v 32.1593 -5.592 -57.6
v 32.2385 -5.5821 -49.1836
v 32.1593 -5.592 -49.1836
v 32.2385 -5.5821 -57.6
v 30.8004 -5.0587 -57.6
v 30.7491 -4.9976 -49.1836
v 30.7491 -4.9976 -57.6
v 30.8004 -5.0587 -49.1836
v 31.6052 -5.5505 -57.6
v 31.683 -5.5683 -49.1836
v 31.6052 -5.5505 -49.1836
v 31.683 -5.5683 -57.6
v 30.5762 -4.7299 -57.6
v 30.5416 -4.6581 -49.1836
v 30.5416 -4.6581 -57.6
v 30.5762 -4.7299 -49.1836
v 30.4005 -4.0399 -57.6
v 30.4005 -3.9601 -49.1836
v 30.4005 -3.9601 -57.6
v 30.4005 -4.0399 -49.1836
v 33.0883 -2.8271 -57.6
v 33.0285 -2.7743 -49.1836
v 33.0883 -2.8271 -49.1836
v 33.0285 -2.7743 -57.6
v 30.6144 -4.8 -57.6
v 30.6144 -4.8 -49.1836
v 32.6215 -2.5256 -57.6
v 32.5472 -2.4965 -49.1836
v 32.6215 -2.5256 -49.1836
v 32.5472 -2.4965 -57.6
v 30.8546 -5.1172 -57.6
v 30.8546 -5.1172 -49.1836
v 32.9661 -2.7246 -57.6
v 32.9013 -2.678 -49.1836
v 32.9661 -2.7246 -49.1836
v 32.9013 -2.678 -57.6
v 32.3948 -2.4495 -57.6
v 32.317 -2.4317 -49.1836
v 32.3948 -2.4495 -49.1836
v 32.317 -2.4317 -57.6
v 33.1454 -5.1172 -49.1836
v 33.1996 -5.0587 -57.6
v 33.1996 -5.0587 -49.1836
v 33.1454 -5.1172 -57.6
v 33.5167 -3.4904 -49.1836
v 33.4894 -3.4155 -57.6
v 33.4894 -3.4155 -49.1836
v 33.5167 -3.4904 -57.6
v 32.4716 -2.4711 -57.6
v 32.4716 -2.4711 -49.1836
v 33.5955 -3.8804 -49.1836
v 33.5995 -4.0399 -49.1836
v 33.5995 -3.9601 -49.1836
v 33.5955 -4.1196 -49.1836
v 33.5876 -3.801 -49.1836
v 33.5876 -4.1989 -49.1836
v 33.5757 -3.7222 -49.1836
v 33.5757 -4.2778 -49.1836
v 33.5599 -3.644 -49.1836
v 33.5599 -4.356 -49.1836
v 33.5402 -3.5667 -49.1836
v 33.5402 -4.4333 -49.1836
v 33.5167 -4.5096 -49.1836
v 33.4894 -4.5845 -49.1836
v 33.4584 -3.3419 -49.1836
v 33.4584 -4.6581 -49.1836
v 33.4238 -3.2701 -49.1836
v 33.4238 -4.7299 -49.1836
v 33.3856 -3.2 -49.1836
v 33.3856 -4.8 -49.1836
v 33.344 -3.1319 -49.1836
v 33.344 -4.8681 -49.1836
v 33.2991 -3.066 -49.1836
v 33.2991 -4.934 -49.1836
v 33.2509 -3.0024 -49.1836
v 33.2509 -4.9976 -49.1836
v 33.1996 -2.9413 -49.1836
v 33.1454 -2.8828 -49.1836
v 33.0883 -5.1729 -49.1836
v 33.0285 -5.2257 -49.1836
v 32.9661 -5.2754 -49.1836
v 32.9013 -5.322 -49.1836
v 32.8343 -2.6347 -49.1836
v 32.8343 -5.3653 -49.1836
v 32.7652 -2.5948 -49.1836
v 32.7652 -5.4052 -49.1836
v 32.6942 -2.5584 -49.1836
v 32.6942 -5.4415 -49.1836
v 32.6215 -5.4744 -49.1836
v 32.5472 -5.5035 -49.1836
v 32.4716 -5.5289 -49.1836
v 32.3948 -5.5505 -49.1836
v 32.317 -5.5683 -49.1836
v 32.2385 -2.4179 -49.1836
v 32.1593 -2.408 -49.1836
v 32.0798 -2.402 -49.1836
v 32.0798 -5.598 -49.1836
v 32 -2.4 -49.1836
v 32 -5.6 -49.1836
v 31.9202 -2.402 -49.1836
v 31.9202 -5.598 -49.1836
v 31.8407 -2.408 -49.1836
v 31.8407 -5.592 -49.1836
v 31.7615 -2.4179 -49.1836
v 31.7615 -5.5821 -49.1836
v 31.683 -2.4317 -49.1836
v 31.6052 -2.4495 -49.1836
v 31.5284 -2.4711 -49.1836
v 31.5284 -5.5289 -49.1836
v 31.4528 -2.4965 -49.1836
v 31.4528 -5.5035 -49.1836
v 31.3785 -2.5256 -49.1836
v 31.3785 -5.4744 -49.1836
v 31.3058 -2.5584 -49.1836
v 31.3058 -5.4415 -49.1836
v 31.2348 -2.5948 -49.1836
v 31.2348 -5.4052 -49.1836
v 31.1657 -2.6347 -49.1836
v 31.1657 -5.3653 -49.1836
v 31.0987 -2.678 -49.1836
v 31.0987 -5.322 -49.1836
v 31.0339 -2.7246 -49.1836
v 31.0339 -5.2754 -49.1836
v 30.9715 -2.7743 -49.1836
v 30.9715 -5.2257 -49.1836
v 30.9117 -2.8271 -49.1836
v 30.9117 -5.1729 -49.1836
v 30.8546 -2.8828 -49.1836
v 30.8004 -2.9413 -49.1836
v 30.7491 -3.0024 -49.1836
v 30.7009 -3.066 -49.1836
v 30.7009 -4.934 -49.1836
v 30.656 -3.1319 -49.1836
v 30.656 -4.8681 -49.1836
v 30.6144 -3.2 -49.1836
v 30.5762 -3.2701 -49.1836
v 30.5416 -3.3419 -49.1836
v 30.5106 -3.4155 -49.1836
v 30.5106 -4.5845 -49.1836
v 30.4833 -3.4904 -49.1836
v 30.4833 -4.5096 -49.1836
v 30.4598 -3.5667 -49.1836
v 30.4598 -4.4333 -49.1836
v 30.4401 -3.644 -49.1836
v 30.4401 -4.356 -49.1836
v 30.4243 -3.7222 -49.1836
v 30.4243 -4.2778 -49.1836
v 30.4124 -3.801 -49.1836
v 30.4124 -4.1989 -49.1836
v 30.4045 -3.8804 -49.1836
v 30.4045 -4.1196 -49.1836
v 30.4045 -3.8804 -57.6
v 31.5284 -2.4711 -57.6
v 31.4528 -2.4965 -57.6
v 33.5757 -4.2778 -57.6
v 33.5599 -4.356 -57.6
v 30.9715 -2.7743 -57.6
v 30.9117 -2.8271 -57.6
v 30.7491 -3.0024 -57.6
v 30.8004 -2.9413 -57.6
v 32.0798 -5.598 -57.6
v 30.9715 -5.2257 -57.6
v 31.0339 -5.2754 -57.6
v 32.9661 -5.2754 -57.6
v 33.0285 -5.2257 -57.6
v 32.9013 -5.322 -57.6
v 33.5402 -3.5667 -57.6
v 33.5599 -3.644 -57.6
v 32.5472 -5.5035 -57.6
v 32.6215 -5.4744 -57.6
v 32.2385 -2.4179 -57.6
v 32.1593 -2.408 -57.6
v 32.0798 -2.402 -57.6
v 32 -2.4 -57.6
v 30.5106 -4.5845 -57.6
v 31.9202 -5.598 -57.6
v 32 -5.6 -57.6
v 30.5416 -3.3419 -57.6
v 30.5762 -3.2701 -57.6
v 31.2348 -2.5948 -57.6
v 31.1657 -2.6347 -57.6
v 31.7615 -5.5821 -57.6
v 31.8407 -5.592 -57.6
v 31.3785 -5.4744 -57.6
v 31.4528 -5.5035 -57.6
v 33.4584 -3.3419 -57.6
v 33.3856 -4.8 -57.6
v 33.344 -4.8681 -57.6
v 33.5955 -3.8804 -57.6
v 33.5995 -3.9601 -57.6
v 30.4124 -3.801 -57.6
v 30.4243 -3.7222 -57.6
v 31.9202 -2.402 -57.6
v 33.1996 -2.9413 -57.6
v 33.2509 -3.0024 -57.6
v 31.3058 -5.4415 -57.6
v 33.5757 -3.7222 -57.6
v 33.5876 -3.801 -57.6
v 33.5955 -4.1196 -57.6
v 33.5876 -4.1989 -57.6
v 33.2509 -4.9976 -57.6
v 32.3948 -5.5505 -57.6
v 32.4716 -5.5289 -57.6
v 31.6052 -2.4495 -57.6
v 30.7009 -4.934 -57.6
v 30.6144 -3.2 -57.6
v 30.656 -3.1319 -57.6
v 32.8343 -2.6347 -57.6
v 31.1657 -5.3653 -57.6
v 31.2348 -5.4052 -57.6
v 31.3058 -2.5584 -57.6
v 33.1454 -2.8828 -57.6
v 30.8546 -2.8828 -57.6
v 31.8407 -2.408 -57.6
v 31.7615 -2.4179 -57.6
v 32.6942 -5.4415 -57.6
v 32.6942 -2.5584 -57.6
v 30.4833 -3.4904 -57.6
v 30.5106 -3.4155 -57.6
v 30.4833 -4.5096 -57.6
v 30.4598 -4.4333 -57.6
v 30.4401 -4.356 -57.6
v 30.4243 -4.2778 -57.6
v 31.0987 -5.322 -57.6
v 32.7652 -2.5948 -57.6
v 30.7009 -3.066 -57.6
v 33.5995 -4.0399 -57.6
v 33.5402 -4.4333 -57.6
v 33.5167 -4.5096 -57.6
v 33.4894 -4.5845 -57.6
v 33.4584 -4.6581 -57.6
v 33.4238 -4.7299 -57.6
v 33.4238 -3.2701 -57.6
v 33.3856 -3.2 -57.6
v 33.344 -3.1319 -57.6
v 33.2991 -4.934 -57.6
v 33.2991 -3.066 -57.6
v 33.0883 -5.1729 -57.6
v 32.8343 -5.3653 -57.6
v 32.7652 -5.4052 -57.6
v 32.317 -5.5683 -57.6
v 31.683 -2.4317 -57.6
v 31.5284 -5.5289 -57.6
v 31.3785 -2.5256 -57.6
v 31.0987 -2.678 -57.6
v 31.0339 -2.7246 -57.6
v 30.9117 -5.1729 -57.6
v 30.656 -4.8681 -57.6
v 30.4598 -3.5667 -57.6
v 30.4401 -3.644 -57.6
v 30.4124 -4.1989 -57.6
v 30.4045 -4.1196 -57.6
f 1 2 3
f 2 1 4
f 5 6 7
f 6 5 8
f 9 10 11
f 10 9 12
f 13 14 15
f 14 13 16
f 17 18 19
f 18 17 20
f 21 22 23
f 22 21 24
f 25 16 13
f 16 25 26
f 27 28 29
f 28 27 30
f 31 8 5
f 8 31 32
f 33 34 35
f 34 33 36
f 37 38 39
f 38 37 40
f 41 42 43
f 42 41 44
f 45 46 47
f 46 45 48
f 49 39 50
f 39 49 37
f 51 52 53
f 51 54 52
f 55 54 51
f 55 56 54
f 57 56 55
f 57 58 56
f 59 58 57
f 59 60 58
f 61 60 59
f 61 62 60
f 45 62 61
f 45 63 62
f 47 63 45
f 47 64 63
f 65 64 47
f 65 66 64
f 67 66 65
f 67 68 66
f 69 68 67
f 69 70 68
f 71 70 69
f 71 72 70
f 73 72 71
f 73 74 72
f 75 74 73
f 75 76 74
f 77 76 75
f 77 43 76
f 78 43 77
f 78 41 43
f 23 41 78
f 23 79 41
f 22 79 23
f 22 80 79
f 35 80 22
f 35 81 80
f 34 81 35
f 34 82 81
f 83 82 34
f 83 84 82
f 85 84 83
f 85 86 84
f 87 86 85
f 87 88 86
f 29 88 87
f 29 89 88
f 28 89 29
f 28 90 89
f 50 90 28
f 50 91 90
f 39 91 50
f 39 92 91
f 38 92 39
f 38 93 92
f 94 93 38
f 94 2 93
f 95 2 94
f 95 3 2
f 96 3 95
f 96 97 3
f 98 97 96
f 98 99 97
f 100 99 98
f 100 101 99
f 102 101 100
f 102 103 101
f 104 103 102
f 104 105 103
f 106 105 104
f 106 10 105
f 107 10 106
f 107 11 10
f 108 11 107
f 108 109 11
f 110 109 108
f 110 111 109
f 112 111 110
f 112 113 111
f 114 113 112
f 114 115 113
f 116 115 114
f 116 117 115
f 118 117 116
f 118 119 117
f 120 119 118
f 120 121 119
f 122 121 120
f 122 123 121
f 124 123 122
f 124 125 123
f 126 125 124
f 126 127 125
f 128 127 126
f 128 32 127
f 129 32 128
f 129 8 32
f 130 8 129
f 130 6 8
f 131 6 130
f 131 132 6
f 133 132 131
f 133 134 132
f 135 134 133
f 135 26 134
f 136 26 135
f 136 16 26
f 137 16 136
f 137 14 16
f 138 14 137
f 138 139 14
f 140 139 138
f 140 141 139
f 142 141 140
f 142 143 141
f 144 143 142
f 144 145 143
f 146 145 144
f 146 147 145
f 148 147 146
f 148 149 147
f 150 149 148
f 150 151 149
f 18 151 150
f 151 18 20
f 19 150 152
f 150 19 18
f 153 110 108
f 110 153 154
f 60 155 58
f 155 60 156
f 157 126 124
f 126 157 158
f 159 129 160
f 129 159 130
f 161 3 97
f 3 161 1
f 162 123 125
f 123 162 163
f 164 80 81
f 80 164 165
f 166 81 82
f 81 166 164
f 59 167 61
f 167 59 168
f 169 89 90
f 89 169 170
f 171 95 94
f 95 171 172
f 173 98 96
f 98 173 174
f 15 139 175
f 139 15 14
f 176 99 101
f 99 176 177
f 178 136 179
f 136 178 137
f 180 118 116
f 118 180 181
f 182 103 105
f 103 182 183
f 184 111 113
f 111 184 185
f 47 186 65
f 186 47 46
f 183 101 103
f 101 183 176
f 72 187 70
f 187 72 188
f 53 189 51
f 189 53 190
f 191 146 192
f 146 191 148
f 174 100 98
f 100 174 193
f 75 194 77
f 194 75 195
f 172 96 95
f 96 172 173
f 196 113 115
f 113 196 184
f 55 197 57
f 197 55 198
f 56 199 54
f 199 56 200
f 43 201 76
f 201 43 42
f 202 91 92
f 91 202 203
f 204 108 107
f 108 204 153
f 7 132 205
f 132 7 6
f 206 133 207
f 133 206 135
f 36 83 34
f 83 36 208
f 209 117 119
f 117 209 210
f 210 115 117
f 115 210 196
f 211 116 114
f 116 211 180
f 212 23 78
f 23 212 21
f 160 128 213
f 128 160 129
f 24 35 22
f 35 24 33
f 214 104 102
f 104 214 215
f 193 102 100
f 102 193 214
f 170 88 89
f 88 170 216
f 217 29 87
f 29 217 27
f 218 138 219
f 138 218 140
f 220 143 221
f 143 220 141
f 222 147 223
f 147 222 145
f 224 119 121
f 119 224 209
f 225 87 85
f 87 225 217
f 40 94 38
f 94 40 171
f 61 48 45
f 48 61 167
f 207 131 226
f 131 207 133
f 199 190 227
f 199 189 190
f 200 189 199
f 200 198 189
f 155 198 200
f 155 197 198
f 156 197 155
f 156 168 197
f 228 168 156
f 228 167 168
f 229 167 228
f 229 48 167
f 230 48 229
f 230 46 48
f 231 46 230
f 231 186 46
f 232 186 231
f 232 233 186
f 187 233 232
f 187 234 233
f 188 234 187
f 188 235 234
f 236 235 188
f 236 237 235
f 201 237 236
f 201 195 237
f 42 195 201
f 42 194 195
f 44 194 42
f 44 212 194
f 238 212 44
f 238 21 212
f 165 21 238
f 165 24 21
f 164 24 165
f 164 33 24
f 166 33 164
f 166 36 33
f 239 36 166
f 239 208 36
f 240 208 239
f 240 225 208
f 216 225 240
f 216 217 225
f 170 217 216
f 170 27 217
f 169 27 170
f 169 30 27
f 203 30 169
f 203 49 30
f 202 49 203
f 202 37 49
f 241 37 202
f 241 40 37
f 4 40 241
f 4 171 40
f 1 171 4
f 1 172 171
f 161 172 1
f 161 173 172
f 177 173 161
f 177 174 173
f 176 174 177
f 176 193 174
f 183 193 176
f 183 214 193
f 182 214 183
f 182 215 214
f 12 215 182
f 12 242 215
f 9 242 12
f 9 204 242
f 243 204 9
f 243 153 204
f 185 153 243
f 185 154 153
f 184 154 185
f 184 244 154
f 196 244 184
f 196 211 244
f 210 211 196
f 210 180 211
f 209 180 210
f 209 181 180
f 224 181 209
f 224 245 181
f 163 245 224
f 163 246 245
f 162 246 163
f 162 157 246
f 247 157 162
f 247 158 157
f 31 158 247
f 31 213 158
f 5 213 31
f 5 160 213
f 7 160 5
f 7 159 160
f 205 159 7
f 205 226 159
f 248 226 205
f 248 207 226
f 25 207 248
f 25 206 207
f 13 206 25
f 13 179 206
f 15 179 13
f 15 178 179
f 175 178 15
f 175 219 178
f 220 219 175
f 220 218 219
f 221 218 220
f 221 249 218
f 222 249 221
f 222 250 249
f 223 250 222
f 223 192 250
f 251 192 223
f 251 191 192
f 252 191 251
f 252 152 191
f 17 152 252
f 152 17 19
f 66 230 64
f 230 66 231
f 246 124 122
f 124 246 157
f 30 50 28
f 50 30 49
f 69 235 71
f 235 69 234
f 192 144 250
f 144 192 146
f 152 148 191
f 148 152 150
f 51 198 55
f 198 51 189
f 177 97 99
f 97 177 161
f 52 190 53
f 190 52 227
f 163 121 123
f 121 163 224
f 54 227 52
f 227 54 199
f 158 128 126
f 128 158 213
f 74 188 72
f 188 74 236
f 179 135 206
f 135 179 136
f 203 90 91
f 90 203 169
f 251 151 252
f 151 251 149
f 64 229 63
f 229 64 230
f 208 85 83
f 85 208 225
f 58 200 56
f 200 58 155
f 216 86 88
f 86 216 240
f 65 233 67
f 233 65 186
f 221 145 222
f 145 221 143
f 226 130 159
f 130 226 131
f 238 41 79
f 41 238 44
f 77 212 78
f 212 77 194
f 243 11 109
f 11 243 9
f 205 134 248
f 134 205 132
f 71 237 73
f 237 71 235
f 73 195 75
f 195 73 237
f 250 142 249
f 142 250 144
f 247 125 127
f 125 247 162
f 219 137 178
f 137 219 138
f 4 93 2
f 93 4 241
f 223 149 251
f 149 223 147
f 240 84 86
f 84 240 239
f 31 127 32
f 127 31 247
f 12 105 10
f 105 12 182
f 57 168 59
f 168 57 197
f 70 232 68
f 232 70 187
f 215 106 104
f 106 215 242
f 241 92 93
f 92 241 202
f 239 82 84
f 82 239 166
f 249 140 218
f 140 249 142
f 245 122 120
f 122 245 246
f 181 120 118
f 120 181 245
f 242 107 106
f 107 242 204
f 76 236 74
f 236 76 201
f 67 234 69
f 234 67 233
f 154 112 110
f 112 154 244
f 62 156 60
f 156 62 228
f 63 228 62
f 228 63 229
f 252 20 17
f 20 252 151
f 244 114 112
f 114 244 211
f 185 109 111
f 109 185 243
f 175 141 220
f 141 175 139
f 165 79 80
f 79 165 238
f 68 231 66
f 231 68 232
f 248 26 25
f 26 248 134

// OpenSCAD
use <../../lib.scad>
use <../../p/1-4cyli.scad>
use <../../p/1-4edge.scad>
use <../../p/3-4edge.scad>
use <../../p/3-8cyli.scad>
use <../../p/3-8edge.scad>
use <../../p/4-4cyli.scad>
use <../../p/5-8edge.scad>
use <../../p/rect.scad>
use <../../p/rect1.scad>
use <../../p/rect2a.scad>
use <../../p/rect2p.scad>
use <../../p/rect3.scad>
use <../../p/stud3.scad>
use <../../p/stud4a.scad>
$fa=1; $fs=0.2;
function ldraw_lib__s__23996s01(realsolid=false) = [
// 0 ~Panel  8 x  8 x  6 Rock Corner Half
// 0 Name: s\23996s01.dat
// 0 Author: Philippe Hurbain [Philo]
// 0 !LDRAW_ORG Subpart UPDATE 2018-02
// 0 !LICENSE Licensed under CC BY 2.0 and CC BY 4.0 : see CAreadme.txt
// 
// 0 BFC CERTIFY CCW
  [0,"BFC","CERTIFY"],
  [0,"BFC","CCW"],
// 
// 0 !HISTORY 2016-03-18 {LEGO Digital Designer} Original part shape
// 0 !HISTORY 2016-06-09 [Philo] File preparation for LDraw Parts Tracker
// 0 !HISTORY 2018-12-08 [PTadmin] Official Update 2018-02
// 
// 
// 2 24 30 27 46 30 32 46
  [2,24,30,27,46,30,32,46],
// 4 16 110 144 50 74 144 46 70 144 46 50 144 50
  [4,16,110,144,50,74,144,46,70,144,46,50,144,50],
// 3 16 106 144 46 74 144 46 110 144 50
  [3,16,106,144,46,74,144,46,110,144,50],
// 4 16 74 144 46 74 144 -14 70 144 -10 70 144 46
  [4,16,74,144,46,74,144,-14,70,144,-10,70,144,46],
// 3 16 70 144 -10 74 144 -14 70 144 -14
  [3,16,70,144,-10,74,144,-14,70,144,-14],
// 3 16 70 144 46 50 144 46 50 144 50
  [3,16,70,144,46,50,144,46,50,144,50],
// 1 16 50 108 48 0 1 0 36 0 0 0 0 -2 rect.dat
  [1,16,50,108,48,0,1,0,36,0,0,0,0,-2, ldraw_lib__rect(realsolid)],
// 1 16 40 72 48 10 0 0 0 -1 0 0 0 -2 rect2p.dat
  [1,16,40,72,48,10,0,0,0,-1,0,0,0,-2, ldraw_lib__rect2p(realsolid)],
// 4 16 30 32 46 30 72 46 50 72 46 66 27 46
  [4,16,30,32,46,30,72,46,50,72,46,66,27,46],
// 3 16 66 27 46 30 27 46 30 32 46
  [3,16,66,27,46,30,27,46,30,32,46],
// 1 16 58 85.5 46 8 0 0 -22.5 0 -36 0 1 0 rect1.dat
  [1,16,58,85.5,46,8,0,0,-22.5,0,-36,0,1,0, ldraw_lib__rect1(realsolid)],
// 4 16 66 99 46 50 144 46 70 144 46 70 99 46
  [4,16,66,99,46,50,144,46,70,144,46,70,99,46],
// 1 16 30 52 48 0 1 0 0 0 -20 -2 0 0 rect3.dat
  [1,16,30,52,48,0,1,0,0,0,-20,-2,0,0, ldraw_lib__rect3(realsolid)],
// 1 16 68 99 20 -2 0 0 0 -1 0 0 0 26 rect.dat
  [1,16,68,99,20,-2,0,0,0,-1,0,0,0,26, ldraw_lib__rect(realsolid)],
// 4 16 70 125 -6 70 99 -6 70 99 46 70 144 46
  [4,16,70,125,-6,70,99,-6,70,99,46,70,144,46],
// 4 16 70 144 -10 70 125 -10 70 125 -6 70 144 46
  [4,16,70,144,-10,70,125,-10,70,125,-6,70,144,46],
// 1 16 68 112 -6 2 0 0 0 0 13 0 -1 0 rect3.dat
  [1,16,68,112,-6,2,0,0,0,0,13,0,-1,0, ldraw_lib__rect3(realsolid)],
// 4 16 66 125 -10 70 125 -10 70 144 -10 50 144 -10
  [4,16,66,125,-10,70,125,-10,70,144,-10,50,144,-10],
// 4 16 66 125 -10 50 144 -10 50 75 -10 66 75 -10
  [4,16,66,125,-10,50,144,-10,50,75,-10,66,75,-10],
// 1 16 68 125 -8 2 0 0 0 -1 0 0 0 -2 rect3.dat
  [1,16,68,125,-8,2,0,0,0,-1,0,0,0,-2, ldraw_lib__rect3(realsolid)],
// 4 16 66 99 -6 66 125 -6 66 125 -10 66 75 -10
  [4,16,66,99,-6,66,125,-6,66,125,-10,66,75,-10],
// 4 16 66 99 -6 66 75 -10 66 75 14 66 99 46
  [4,16,66,99,-6,66,75,-10,66,75,14,66,99,46],
// 4 16 66 51 34 66 99 46 66 75 14 66 51 14
  [4,16,66,51,34,66,99,46,66,75,14,66,51,14],
// 4 16 66 27 46 66 99 46 66 51 34 66 27 34
  [4,16,66,27,46,66,99,46,66,51,34,66,27,34],
// 4 16 46 75 14 66 75 14 66 75 -10 50 75 -10
  [4,16,46,75,14,66,75,14,66,75,-10,50,75,-10],
// 1 16 48 75 -8 0 0 2 0 -1 0 10 0 -12 rect2p.dat
  [1,16,48,75,-8,0,0,2,0,-1,0,10,0,-12, ldraw_lib__rect2p(realsolid)],
// 1 16 56 39 34 0 0 10 -12 0 0 0 -1 0 rect.dat
  [1,16,56,39,34,0,0,10,-12,0,0,0,-1,0, ldraw_lib__rect(realsolid)],
// 4 16 66 27 46 66 27 34 46 27 34 30 27 46
  [4,16,66,27,46,66,27,34,46,27,34,30,27,46],
// 4 16 46 27 -6 26 27 -6 26 27 26 46 27 34
  [4,16,46,27,-6,26,27,-6,26,27,26,46,27,34],
// 4 16 30 27 46 46 27 34 26 27 26 14 27 46
  [4,16,30,27,46,46,27,34,26,27,26,14,27,46],
// 3 16 14 27 26 14 27 46 26 27 26
  [3,16,14,27,26,14,27,46,26,27,26],
// 1 16 56 51 24 10 0 0 0 -1 0 0 0 -10 rect3.dat
  [1,16,56,51,24,10,0,0,0,-1,0,0,0,-10, ldraw_lib__rect3(realsolid)],
// 4 16 46 27 34 46 51 34 46 51 14 46 27 -6
  [4,16,46,27,34,46,51,34,46,51,14,46,27,-6],
// 4 16 46 75 -6 46 27 -6 46 51 14 46 75 14
  [4,16,46,75,-6,46,27,-6,46,51,14,46,75,14],
// 1 16 56 63 14 10 0 0 0 0 12 0 -1 0 rect3.dat
  [1,16,56,63,14,10,0,0,0,0,12,0,-1,0, ldraw_lib__rect3(realsolid)],
// 1 16 50 109.5 -20 0 1 0 0 0 34.5 10 0 0 rect3.dat
  [1,16,50,109.5,-20,0,1,0,0,0,34.5,10,0,0, ldraw_lib__rect3(realsolid)],
// 1 16 40 109.5 -30 0 0 -10 34.5 0 0 0 -1 0 rect3.dat
  [1,16,40,109.5,-30,0,0,-10,34.5,0,0,0,-1,0, ldraw_lib__rect3(realsolid)],
// 4 16 26 75 -26 26 75 -6 46 75 -6 50 75 -30
  [4,16,26,75,-26,26,75,-6,46,75,-6,50,75,-30],
// 3 16 26 75 -26 50 75 -30 30 75 -30
  [3,16,26,75,-26,50,75,-30,30,75,-30],
// 1 16 36 51 -6 10 0 0 0 0 24 0 -1 0 rect.dat
  [1,16,36,51,-6,10,0,0,0,0,24,0,-1,0, ldraw_lib__rect(realsolid)],
// 1 16 26 51 -16 0 1 0 24 0 0 0 0 -10 rect3.dat
  [1,16,26,51,-16,0,1,0,24,0,0,0,0,-10, ldraw_lib__rect3(realsolid)],
// 3 16 26 27 -6 26 27 -26 6 27 -6
  [3,16,26,27,-6,26,27,-26,6,27,-6],
// 1 16 26 15 10 0 1 0 0 0 12 16 0 0 rect.dat
  [1,16,26,15,10,0,1,0,0,0,12,16,0,0, ldraw_lib__rect(realsolid)],
// 1 16 20 15 26 0 0 -6 -12 0 0 0 1 0 rect3.dat
  [1,16,20,15,26,0,0,-6,-12,0,0,0,1,0, ldraw_lib__rect3(realsolid)],
// 4 16 14 3 6 14 3 26 26 3 26 26 3 -6
  [4,16,14,3,6,14,3,26,26,3,26,26,3,-6],
// 1 16 10 3 0 -10 0 -6 0 -1 0 0 0 6 rect2p.dat
  [1,16,10,3,0,-10,0,-6,0,-1,0,0,0,6, ldraw_lib__rect2p(realsolid)],
// 1 16 14 15 16 0 -1 0 -12 0 0 0 0 -10 rect3.dat
  [1,16,14,15,16,0,-1,0,-12,0,0,0,0,-10, ldraw_lib__rect3(realsolid)],
// 1 16 16 15 -6 0 0 -10 12 0 0 0 -1 0 rect2a.dat
  [1,16,16,15,-6,0,0,-10,12,0,0,0,-1,0, ldraw_lib__rect2a(realsolid)],
// 1 16 2 32 28 -2 0 10 0 -1 0 2 0 0 rect1.dat
  [1,16,2,32,28,-2,0,10,0,-1,0,2,0,0, ldraw_lib__rect1(realsolid)],
// 1 16 12 32 38 -2 0 0 0 -1 0 2 0 10 rect1.dat
  [1,16,12,32,38,-2,0,0,0,-1,0,2,0,10, ldraw_lib__rect1(realsolid)],
// 4 16 14 32 46 10 32 50 30 32 50 30 32 46
  [4,16,14,32,46,10,32,50,30,32,50,30,32,46],
// 1 16 4 27 16 0 0 -10 0 -1 0 -10 0 0 rect3.dat
  [1,16,4,27,16,0,0,-10,0,-1,0,-10,0,0, ldraw_lib__rect3(realsolid)],
// 1 16 4 15 6 -10 0 0 0 0 12 0 1 0 rect1.dat
  [1,16,4,15,6,-10,0,0,0,0,12,0,1,0, ldraw_lib__rect1(realsolid)],
// 1 16 -8 32 18 -2 0 0 0 -1 0 2 0 10 rect1.dat
  [1,16,-8,32,18,-2,0,0,0,-1,0,2,0,10, ldraw_lib__rect1(realsolid)],
// 1 16 110 132 30 0 -1 0 0 0 12 -20 0 0 rect.dat
  [1,16,110,132,30,0,-1,0,0,0,12,-20,0,0, ldraw_lib__rect(realsolid)],
// 1 16 40 72 -20 0 0 -10 0 1 0 10 0 0 rect2a.dat
  [1,16,40,72,-20,0,0,-10,0,1,0,10,0,0, ldraw_lib__rect2a(realsolid)],
// 4 16 50 72 -10 50 72 -30 70 72 -30 70 72 10
  [4,16,50,72,-10,50,72,-30,70,72,-30,70,72,10],
// 3 16 50 72 -10 70 72 10 50 72 10
  [3,16,50,72,-10,70,72,10,50,72,10],
// 1 16 60 120 -50 -10 0 0 0 0 24 0 1 0 rect.dat
  [1,16,60,120,-50,-10,0,0,0,0,24,0,1,0, ldraw_lib__rect(realsolid)],
// 4 16 70 144 -50 70 144 -30 70 120 -30 70 96 -50
  [4,16,70,144,-50,70,144,-30,70,120,-30,70,96,-50],
// 3 16 70 96 -30 70 96 -50 70 120 -30
  [3,16,70,96,-30,70,96,-50,70,120,-30],
// 1 16 70 108 -20 0 -1 0 12 0 0 0 0 10 rect2a.dat
  [1,16,70,108,-20,0,-1,0,12,0,0,0,0,10, ldraw_lib__rect2a(realsolid)],
// 4 16 70 72 -30 70 96 -30 70 96 -10 70 72 10
  [4,16,70,72,-30,70,96,-30,70,96,-10,70,72,10],
// 3 16 70 96 -10 70 96 50 70 72 10
  [3,16,70,96,-10,70,96,50,70,72,10],
// 4 16 70 72 10 70 96 50 70 48 30 70 48 10
  [4,16,70,72,10,70,96,50,70,48,30,70,48,10],
// 4 16 70 48 30 70 96 50 70 24 50 70 24 30
  [4,16,70,48,30,70,96,50,70,24,50,70,24,30],
// 1 16 80 132 -30 -10 0 0 0 0 12 0 1 0 rect.dat
  [1,16,80,132,-30,-10,0,0,0,0,12,0,1,0, ldraw_lib__rect(realsolid)],
// 4 16 90 120 -10 90 120 -30 90 144 -30 90 144 10
  [4,16,90,120,-10,90,120,-30,90,144,-30,90,144,10],
// 1 16 90 120 0 0 -1 0 -12 0 -12 0 0 -10 rect2p.dat
  [1,16,90,120,0,0,-1,0,-12,0,-12,0,0,-10, ldraw_lib__rect2p(realsolid)],
// 4 16 90 96 50 90 96 -10 90 120 10 90 120 50
  [4,16,90,96,50,90,96,-10,90,120,10,90,120,50],
// 1 16 80 120 -20 10 0 0 0 1 0 0 0 10 rect2a.dat
  [1,16,80,120,-20,10,0,0,0,1,0,0,0,10, ldraw_lib__rect2a(realsolid)],
// 1 16 100 132 10 -10 0 0 0 0 12 0 1 0 rect2p.dat
  [1,16,100,132,10,-10,0,0,0,0,12,0,1,0, ldraw_lib__rect2p(realsolid)],
// 1 16 100 120 30 0 0 -10 0 1 0 20 0 0 rect2a.dat
  [1,16,100,120,30,0,0,-10,0,1,0,20,0,0, ldraw_lib__rect2a(realsolid)],
// 3 16 70 24 50 50 24 30 70 24 30
  [3,16,70,24,50,50,24,30,70,24,30],
// 4 16 30 24 30 50 24 30 70 24 50 10 24 50
  [4,16,30,24,30,50,24,30,70,24,50,10,24,50],
// 1 16 40 24 10 -10 0 0 0 1 0 0 0 -20 rect3.dat
  [1,16,40,24,10,-10,0,0,0,1,0,0,0,-20, ldraw_lib__rect3(realsolid)],
// 3 16 30 24 30 10 24 50 10 24 30
  [3,16,30,24,30,10,24,50,10,24,30],
// 1 16 60 36 30 0 0 -10 -12 0 0 0 1 0 rect.dat
  [1,16,60,36,30,0,0,-10,-12,0,0,0,1,0, ldraw_lib__rect(realsolid)],
// 4 16 50 48 10 50 48 30 50 24 30 50 24 -10
  [4,16,50,48,10,50,48,30,50,24,30,50,24,-10],
// 4 16 50 48 10 50 24 -10 50 72 -10 50 72 10
  [4,16,50,48,10,50,24,-10,50,72,-10,50,72,10],
// 1 16 60 48 20 -10 0 0 0 1 0 0 0 -10 rect3.dat
  [1,16,60,48,20,-10,0,0,0,1,0,0,0,-10, ldraw_lib__rect3(realsolid)],
// 1 16 60 60 10 -10 0 0 0 0 12 0 1 0 rect3.dat
  [1,16,60,60,10,-10,0,0,0,0,12,0,1,0, ldraw_lib__rect3(realsolid)],
// 4 16 70 96 50 90 96 50 90 120 50 50 144 50
  [4,16,70,96,50,90,96,50,90,120,50,50,144,50],
// 4 16 110 144 50 50 144 50 90 120 50 110 120 50
  [4,16,110,144,50,50,144,50,90,120,50,110,120,50],
// 1 16 60 84 50 10 0 0 -24 0 36 0 -1 0 rect1.dat
  [1,16,60,84,50,10,0,0,-24,0,36,0,-1,0, ldraw_lib__rect1(realsolid)],
// 4 16 30 32 50 70 24 50 50 72 50 30 72 50
  [4,16,30,32,50,70,24,50,50,72,50,30,72,50],
// 4 16 10 24 50 70 24 50 30 32 50 10 32 50
  [4,16,10,24,50,70,24,50,30,32,50,10,32,50],
// 1 16 80 96 20 0 0 -10 0 1 0 30 0 0 rect.dat
  [1,16,80,96,20,0,0,-10,0,1,0,30,0,0, ldraw_lib__rect(realsolid)],
// 4 16 70 120 -10 90 120 -10 90 96 -10 70 96 -10
  [4,16,70,120,-10,90,120,-10,90,96,-10,70,96,-10],
// 1 16 60 84 -30 10 0 0 0 0 -12 0 1 0 rect.dat
  [1,16,60,84,-30,10,0,0,0,0,-12,0,1,0, ldraw_lib__rect(realsolid)],
// 1 16 60 96 -40 0 0 -10 0 1 0 10 0 0 rect2p.dat
  [1,16,60,96,-40,0,0,-10,0,1,0,10,0,0, ldraw_lib__rect2p(realsolid)],
// 1 16 50 84 -40 0 -1 0 -12 0 0 0 0 -10 rect2a.dat
  [1,16,50,84,-40,0,-1,0,-12,0,0,0,0,-10, ldraw_lib__rect2a(realsolid)],
// 1 16 40 48 -10 0 0 10 24 0 0 0 1 0 rect2p.dat
  [1,16,40,48,-10,0,0,10,24,0,0,0,1,0, ldraw_lib__rect2p(realsolid)],
// 1 16 30 48 -20 0 -1 0 -24 0 0 0 0 -10 rect2a.dat
  [1,16,30,48,-20,0,-1,0,-24,0,0,0,0,-10, ldraw_lib__rect2a(realsolid)],
// 1 16 20 12 -10 -10 0 0 0 0 12 0 1 0 rect.dat
  [1,16,20,12,-10,-10,0,0,0,0,12,0,1,0, ldraw_lib__rect(realsolid)],
// 1 16 30 12 10 0 -1 0 0 0 -12 20 0 0 rect2a.dat
  [1,16,30,12,10,0,-1,0,0,0,-12,20,0,0, ldraw_lib__rect2a(realsolid)],
// 1 16 20 12 30 0 0 -10 12 0 0 0 -1 0 rect3.dat
  [1,16,20,12,30,0,0,-10,12,0,0,0,-1,0, ldraw_lib__rect3(realsolid)],
// 4 16 30 0 30 10 0 30 10 0 10 30 0 -10
  [4,16,30,0,30,10,0,30,10,0,10,30,0,-10],
// 1 16 10 0 0 -10 0 -10 0 1 0 10 0 0 rect1.dat
  [1,16,10,0,0,-10,0,-10,0,1,0,10,0,0, ldraw_lib__rect1(realsolid)],
// 1 16 10 12 20 0 1 0 12 0 0 0 0 -10 rect3.dat
  [1,16,10,12,20,0,1,0,12,0,0,0,0,-10, ldraw_lib__rect3(realsolid)],
// 1 16 0 12 10 0 0 -10 12 0 0 0 -1 0 rect2a.dat
  [1,16,0,12,10,0,0,-10,12,0,0,0,-1,0, ldraw_lib__rect2a(realsolid)],
// 1 16 -10 28 20 0 1 0 0 0 -4 -10 0 0 rect3.dat
  [1,16,-10,28,20,0,1,0,0,0,-4,-10,0,0, ldraw_lib__rect3(realsolid)],
// 1 16 0 28 30 0 0 10 -4 0 0 0 -1 0 rect2a.dat
  [1,16,0,28,30,0,0,10,-4,0,0,0,-1,0, ldraw_lib__rect2a(realsolid)],
// 1 16 10 28 40 0 1 0 -4 0 0 0 0 10 rect2a.dat
  [1,16,10,28,40,0,1,0,-4,0,0,0,0,10, ldraw_lib__rect2a(realsolid)],
// 4 16 -10 24 10 10 24 10 10 24 30 -10 24 30
  [4,16,-10,24,10,10,24,10,10,24,30,-10,24,30],
// 1 16 10 29.5 18 0 -1 0 2.5 0 0 0 0 8 rect.dat
  [1,16,10,29.5,18,0,-1,0,2.5,0,0,0,0,8, ldraw_lib__rect(realsolid)],
// 1 16 2 29.5 10 0 0 -8 -2.5 0 0 0 1 0 rect3.dat
  [1,16,2,29.5,10,0,0,-8,-2.5,0,0,0,1,0, ldraw_lib__rect3(realsolid)],
// 4 16 6 32 14 6 32 26 10 32 26 10 32 10
  [4,16,6,32,14,6,32,26,10,32,26,10,32,10],
// 4 16 6 32 14 10 32 10 -6 32 10 -6 32 14
  [4,16,6,32,14,10,32,10,-6,32,10,-6,32,14],
// 1 16 0 29.5 14 -6 0 0 0 0 -2.5 0 -1 0 rect.dat
  [1,16,0,29.5,14,-6,0,0,0,0,-2.5,0,-1,0, ldraw_lib__rect(realsolid)],
// 1 16 6 29.5 20 0 1 0 -2.5 0 0 0 0 6 rect3.dat
  [1,16,6,29.5,20,0,1,0,-2.5,0,0,0,0,6, ldraw_lib__rect3(realsolid)],
// 1 16 30 29.5 38 0 -1 0 -2.5 0 0 0 0 -8 rect3.dat
  [1,16,30,29.5,38,0,-1,0,-2.5,0,0,0,0,-8, ldraw_lib__rect3(realsolid)],
// 1 16 22 29.5 30 0 0 -8 -2.5 0 0 0 1 0 rect3.dat
  [1,16,22,29.5,30,0,0,-8,-2.5,0,0,0,1,0, ldraw_lib__rect3(realsolid)],
// 4 16 26 32 34 26 32 46 30 32 46 30 32 30
  [4,16,26,32,34,26,32,46,30,32,46,30,32,30],
// 4 16 26 32 34 30 32 30 14 32 30 14 32 34
  [4,16,26,32,34,30,32,30,14,32,30,14,32,34],
// 1 16 26 29.5 40 0 1 0 -2.5 0 0 0 0 6 rect.dat
  [1,16,26,29.5,40,0,1,0,-2.5,0,0,0,0,6, ldraw_lib__rect(realsolid)],
// 1 16 20 29.5 34 0 0 -6 2.5 0 0 0 -1 0 rect3.dat
  [1,16,20,29.5,34,0,0,-6,2.5,0,0,0,-1,0, ldraw_lib__rect3(realsolid)],
// 1 16 48 99 -28 2 0 0 0 -1 0 0 0 -2 rect.dat
  [1,16,48,99,-28,2,0,0,0,-1,0,0,0,-2, ldraw_lib__rect(realsolid)],
// 1 16 48 87 -26 -2 0 0 0 0 -12 0 -1 0 rect3.dat
  [1,16,48,87,-26,-2,0,0,0,0,-12,0,-1,0, ldraw_lib__rect3(realsolid)],
// 1 16 46 87 -28 0 1 0 0 0 -12 -2 0 0 rect2a.dat
  [1,16,46,87,-28,0,1,0,0,0,-12,-2,0,0, ldraw_lib__rect2a(realsolid)],
// 2 24 106 144 46 74 144 46
  [2,24,106,144,46,74,144,46],
// 2 24 70 144 -10 70 144 46
  [2,24,70,144,-10,70,144,46],
// 2 24 50 144 50 110 144 50
  [2,24,50,144,50,110,144,50],
// 2 24 70 144 46 50 144 46
  [2,24,70,144,46,50,144,46],
// 2 24 66 27 46 30 27 46
  [2,24,66,27,46,30,27,46],
// 2 24 70 144 46 70 99 46
  [2,24,70,144,46,70,99,46],
// 2 24 70 144 -10 70 125 -10
  [2,24,70,144,-10,70,125,-10],
// 2 24 70 144 -10 50 144 -10
  [2,24,70,144,-10,50,144,-10],
// 2 24 50 75 -10 66 75 -10
  [2,24,50,75,-10,66,75,-10],
// 2 24 66 75 -10 66 125 -10
  [2,24,66,75,-10,66,125,-10],
// 2 24 66 75 -10 66 75 14
  [2,24,66,75,-10,66,75,14],
// 2 24 66 27 34 66 27 46
  [2,24,66,27,34,66,27,46],
// 2 24 46 27 34 46 27 -6
  [2,24,46,27,34,46,27,-6],
// 2 24 14 27 46 30 27 46
  [2,24,14,27,46,30,27,46],
// 2 24 14 27 26 14 27 46
  [2,24,14,27,26,14,27,46],
// 2 24 10 32 50 30 32 50
  [2,24,10,32,50,30,32,50],
// 2 24 70 72 -30 70 72 10
  [2,24,70,72,-30,70,72,10],
// 2 24 50 72 10 50 72 -10
  [2,24,50,72,10,50,72,-10],
// 2 24 70 144 -50 70 144 -30
  [2,24,70,144,-50,70,144,-30],
// 2 24 70 24 50 70 24 30
  [2,24,70,24,50,70,24,30],
// 2 24 90 144 -30 90 144 10
  [2,24,90,144,-30,90,144,10],
// 2 24 90 120 50 90 96 50
  [2,24,90,120,50,90,96,50],
// 2 24 70 24 50 10 24 50
  [2,24,70,24,50,10,24,50],
// 4 16 66 144 -14 70 144 -10 70 144 -50 66 144 -46
  [4,16,66,144,-14,70,144,-10,70,144,-50,66,144,-46],
// 1 16 58 144 -48 -2 0 10 0 -1 0 2 0 0 rect1.dat
  [1,16,58,144,-48,-2,0,10,0,-1,0,2,0,0, ldraw_lib__rect1(realsolid)],
// 1 16 42 144 -32 2 0 -10 0 -1 0 -2 0 0 rect1.dat
  [1,16,42,144,-32,2,0,-10,0,-1,0,-2,0,0, ldraw_lib__rect1(realsolid)],
// 1 16 52 144 -22 2 0 0 0 -1 0 -2 0 -10 rect1.dat
  [1,16,52,144,-22,2,0,0,0,-1,0,-2,0,-10, ldraw_lib__rect1(realsolid)],
// 4 16 66 144 -14 54 144 -14 50 144 -10 70 144 -10
  [4,16,66,144,-14,54,144,-14,50,144,-10,70,144,-10],
// 4 16 46 99 -34 46 75 -34 34 75 -34 34 144 -34
  [4,16,46,99,-34,46,75,-34,34,75,-34,34,144,-34],
// 4 16 46 99 -34 34 144 -34 54 144 -34 54 99 -34
  [4,16,46,99,-34,34,144,-34,54,144,-34,54,99,-34],
// 1 16 46 87 -40 0 1 0 -12 0 0 0 0 6 rect.dat
  [1,16,46,87,-40,0,1,0,-12,0,0,0,0,6, ldraw_lib__rect(realsolid)],
// 4 16 46 99 -46 46 99 -34 54 99 -34 66 99 -46
  [4,16,46,99,-46,46,99,-34,54,99,-34,66,99,-46],
// 4 16 66 99 -26 66 99 -46 54 99 -34 54 99 -26
  [4,16,66,99,-26,66,99,-46,54,99,-34,54,99,-26],
// 1 16 56 121.5 -46 -10 0 0 0 0 -22.5 0 -1 0 rect3.dat
  [1,16,56,121.5,-46,-10,0,0,0,0,-22.5,0,-1,0, ldraw_lib__rect3(realsolid)],
// 4 16 66 144 -46 66 99 -46 66 99 -26 66 144 -14
  [4,16,66,144,-46,66,99,-46,66,99,-26,66,144,-14],
// 4 16 66 75 -14 66 144 -14 66 99 -26 66 75 -26
  [4,16,66,75,-14,66,144,-14,66,99,-26,66,75,-26],
// 1 16 60 87 -26 0 0 6 -12 0 0 0 -1 0 rect.dat
  [1,16,60,87,-26,0,0,6,-12,0,0,0,-1,0, ldraw_lib__rect(realsolid)],
// 1 16 60 75 -20 -6 0 0 0 -1 0 0 0 6 rect3.dat
  [1,16,60,75,-20,-6,0,0,0,-1,0,0,0,6, ldraw_lib__rect3(realsolid)],
// 4 16 54 75 -14 54 75 -26 54 99 -26 54 144 -14
  [4,16,54,75,-14,54,75,-26,54,99,-26,54,144,-14],
// 4 16 54 144 -34 54 144 -14 54 99 -26 54 99 -34
  [4,16,54,144,-34,54,144,-14,54,99,-26,54,99,-34],
// 1 16 60 109.5 -14 -6 0 0 0 0 34.5 0 1 0 rect3.dat
  [1,16,60,109.5,-14,-6,0,0,0,0,34.5,0,1,0, ldraw_lib__rect3(realsolid)],
// 2 24 66 144 -46 66 144 -14
  [2,24,66,144,-46,66,144,-14],
// 2 24 34 144 -34 34 75 -34
  [2,24,34,144,-34,34,75,-34],
// 2 24 34 75 -34 46 75 -34
  [2,24,34,75,-34,46,75,-34],
// 2 24 54 99 -34 46 99 -34
  [2,24,54,99,-34,46,99,-34],
// 2 24 54 144 -34 54 99 -34
  [2,24,54,144,-34,54,99,-34],
// 2 24 66 99 -26 66 99 -46
  [2,24,66,99,-26,66,99,-46],
// 2 24 54 99 -34 54 99 -26
  [2,24,54,99,-34,54,99,-26],
// 1 16 80 99 2 -6 0 0 0 -1 0 0 0 8 rect.dat
  [1,16,80,99,2,-6,0,0,0,-1,0,0,0,8, ldraw_lib__rect(realsolid)],
// 4 16 86 144 -26 86 144 10 90 144 10 90 144 -30
  [4,16,86,144,-26,86,144,10,90,144,10,90,144,-30],
// 4 16 86 144 -26 90 144 -30 70 144 -30 70 144 -26
  [4,16,86,144,-26,90,144,-30,70,144,-30,70,144,-26],
// 1 16 80 111 -6 6 0 0 0 0 12 0 -1 0 rect3.dat
  [1,16,80,111,-6,6,0,0,0,0,12,0,-1,0, ldraw_lib__rect3(realsolid)],
// 4 16 74 99 10 74 99 -6 74 123 -6 74 144 10
  [4,16,74,99,10,74,99,-6,74,123,-6,74,144,10],
// 4 16 74 144 -14 74 144 10 74 123 -6 74 123 -14
  [4,16,74,144,-14,74,144,10,74,123,-6,74,123,-14],
// 4 16 86 123 -6 86 99 -6 86 99 10 86 144 10
  [4,16,86,123,-6,86,99,-6,86,99,10,86,144,10],
// 4 16 86 123 -6 86 144 10 86 144 -26 86 123 -26
  [4,16,86,123,-6,86,144,10,86,144,-26,86,123,-26],
// 1 16 78 133.5 -26 -8 0 0 0 0 -10.5 0 -1 0 rect.dat
  [1,16,78,133.5,-26,-8,0,0,0,0,-10.5,0,-1,0, ldraw_lib__rect(realsolid)],
// 4 16 70 123 -26 70 123 -14 74 123 -14 86 123 -26
  [4,16,70,123,-26,70,123,-14,74,123,-14,86,123,-26],
// 4 16 86 123 -6 86 123 -26 74 123 -14 74 123 -6
  [4,16,86,123,-6,86,123,-26,74,123,-14,74,123,-6],
// 1 16 72 133.5 -14 2 0 0 0 0 -10.5 0 1 0 rect.dat
  [1,16,72,133.5,-14,2,0,0,0,0,-10.5,0,1,0, ldraw_lib__rect(realsolid)],
// 1 16 72 144 -20 0 0 2 0 -1 0 1 0 0 rect3.dat
  [1,16,72,144,-20,0,0,2,0,-1,0,1,0,0, ldraw_lib__rect3(realsolid)],
// 1 16 72 133.5 -21 2 0 0 0 0 -10.5 0 1 0 rect3.dat
  [1,16,72,133.5,-21,2,0,0,0,0,-10.5,0,1,0, ldraw_lib__rect3(realsolid)],
// 1 16 74 133.5 -20 0 -1 0 0 0 -10.5 1 0 0 rect2a.dat
  [1,16,74,133.5,-20,0,-1,0,0,0,-10.5,1,0,0, ldraw_lib__rect2a(realsolid)],
// 1 16 72 133.5 -19 -2 0 0 0 0 -10.5 0 -1 0 rect2a.dat
  [1,16,72,133.5,-19,-2,0,0,0,0,-10.5,0,-1,0, ldraw_lib__rect2a(realsolid)],
// 1 16 81 121.5 8 0 -1 0 0 0 -22.5 2 0 0 rect.dat
  [1,16,81,121.5,8,0,-1,0,0,0,-22.5,2,0,0, ldraw_lib__rect(realsolid)],
// 1 16 79.5 121.5 6 0 0 -1.5 -22.5 0 0 0 1 0 rect3.dat
  [1,16,79.5,121.5,6,0,0,-1.5,-22.5,0,0,0,1,0, ldraw_lib__rect3(realsolid)],
// 1 16 79.5 144 8 -1.5 0 0 0 -1 0 0 0 2 rect1.dat
  [1,16,79.5,144,8,-1.5,0,0,0,-1,0,0,0,2, ldraw_lib__rect1(realsolid)],
// 1 16 78 121.5 8 0 1 0 -22.5 0 0 0 0 2 rect2a.dat
  [1,16,78,121.5,8,0,1,0,-22.5,0,0,0,0,2, ldraw_lib__rect2a(realsolid)],
// 2 24 86 144 -26 86 144 10
  [2,24,86,144,-26,86,144,10],
// 2 24 74 144 -14 74 144 10
  [2,24,74,144,-14,74,144,10],
// 2 24 74 123 -6 74 123 -14
  [2,24,74,123,-6,74,123,-14],
// 2 24 86 123 -26 86 123 -6
  [2,24,86,123,-26,86,123,-6],
// 2 24 70 123 -14 70 123 -26
  [2,24,70,123,-14,70,123,-26],
// 4 16 106 144 14 110 144 10 74 144 10 74 144 14
  [4,16,106,144,14,110,144,10,74,144,10,74,144,14],
// 4 16 110 144 50 110 144 10 106 144 14 106 144 46
  [4,16,110,144,50,110,144,10,106,144,14,106,144,46],
// 1 16 85.7574 111 30 0 1 0 -12 0 0 0 0 16 rect.dat
  [1,16,85.7574,111,30,0,1,0,-12,0,0,0,0,16, ldraw_lib__rect(realsolid)],
// 1 16 80.2196 99 30 0 0 -6.2196 0 -1 0 -16 0 0 rect3.dat
  [1,16,80.2196,99,30,0,0,-6.2196,0,-1,0,-16,0,0, ldraw_lib__rect3(realsolid)],
// 1 16 74 121.5 30 0 -1 0 0 0 22.5 -16 0 0 rect3.dat
  [1,16,74,121.5,30,0,-1,0,0,0,22.5,-16,0,0, ldraw_lib__rect3(realsolid)],
// 4 16 106 144 46 106 123 46 85.7574 123 46 74 144 46
  [4,16,106,144,46,106,123,46,85.7574,123,46,74,144,46],
// 4 16 74 99 46 74 144 46 85.7574 123 46 85.7574 99 46
  [4,16,74,99,46,74,144,46,85.7574,123,46,85.7574,99,46],
// 1 16 106 133.5 30 0 1 0 0 0 -10.5 -16 0 0 rect.dat
  [1,16,106,133.5,30,0,1,0,0,0,-10.5,-16,0,0, ldraw_lib__rect(realsolid)],
// 1 16 95.8787 123 30 -10.1213 0 0 0 -1 0 0 0 16 rect2p.dat
  [1,16,95.8787,123,30,-10.1213,0,0,0,-1,0,0,0,16, ldraw_lib__rect2p(realsolid)],
// 4 16 74 99 14 85.7574 99 14 85.7574 123 14 74 144 14
  [4,16,74,99,14,85.7574,99,14,85.7574,123,14,74,144,14],
// 4 16 106 144 14 74 144 14 85.7574 123 14 106 123 14
  [4,16,106,144,14,74,144,14,85.7574,123,14,106,123,14],
// 2 24 74 144 14 106 144 14
  [2,24,74,144,14,106,144,14],
// 3 16 30 24 -30 30 24 -10 10 24 -10
  [3,16,30,24,-30,30,24,-10,10,24,-10],
// 3 16 50 72 -50 50 72 -30 30 72 -30
  [3,16,50,72,-50,50,72,-30,30,72,-30],
// 3 16 46 75 -34 46 75 -46 34 75 -34
  [3,16,46,75,-34,46,75,-46,34,75,-34],
// 1 16 -6 29.5 8 0 -1 0 0 0 2.5 -2 0 0 rect2a.dat
  [1,16,-6,29.5,8,0,-1,0,0,0,2.5,-2,0,0, ldraw_lib__rect2a(realsolid)],
// 1 16 -6 29.5 20 0 -1 0 2.5 0 0 0 0 6 rect2a.dat
  [1,16,-6,29.5,20,0,-1,0,2.5,0,0,0,0,6, ldraw_lib__rect2a(realsolid)],
// 1 16 20 29.5 46 -6 0 0 0 0 2.5 0 1 0 rect2a.dat
  [1,16,20,29.5,46,-6,0,0,0,0,2.5,0,1,0, ldraw_lib__rect2a(realsolid)],
// 1 16 14 29.5 40 0 -1 0 2.5 0 0 0 0 6 rect1.dat
  [1,16,14,29.5,40,0,-1,0,2.5,0,0,0,0,6, ldraw_lib__rect1(realsolid)],
// 1 16 14 29.5 28 0 -1 0 0 0 2.5 -2 0 0 rect2a.dat
  [1,16,14,29.5,28,0,-1,0,0,0,2.5,-2,0,0, ldraw_lib__rect2a(realsolid)],
// 1 16 12 29.5 26 0 0 2 2.5 0 0 0 1 0 rect1.dat
  [1,16,12,29.5,26,0,0,2,2.5,0,0,0,1,0, ldraw_lib__rect1(realsolid)],
// 1 16 0 29.5 26 0 0 6 2.5 0 0 0 1 0 rect1.dat
  [1,16,0,29.5,26,0,0,6,2.5,0,0,0,1,0, ldraw_lib__rect1(realsolid)],
// 1 16 70 133.5 -16.5 0 -1 0 10.5 0 0 0 0 2.5 rect1.dat
  [1,16,70,133.5,-16.5,0,-1,0,10.5,0,0,0,0,2.5, ldraw_lib__rect1(realsolid)],
// 1 16 70 133.5 -23.5 0 -1 0 10.5 0 0 0 0 2.5 rect1.dat
  [1,16,70,133.5,-23.5,0,-1,0,10.5,0,0,0,0,2.5, ldraw_lib__rect1(realsolid)],
// 1 16 83.5 121.5 10 0 0 2.5 22.5 0 0 0 1 0 rect2a.dat
  [1,16,83.5,121.5,10,0,0,2.5,22.5,0,0,0,1,0, ldraw_lib__rect2a(realsolid)],
// 1 16 76 121.5 10 -2 0 0 0 0 22.5 0 1 0 rect2a.dat
  [1,16,76,121.5,10,-2,0,0,0,0,22.5,0,1,0, ldraw_lib__rect2a(realsolid)],
// 1 16 80 123 -10 1 0 0 0 -5.25 0 0 0 -1 stud3.dat
  [1,16,80,123,-10,1,0,0,0,-5.25,0,0,0,-1, ldraw_lib__stud3(realsolid)],
// 1 16 90 140 30 1 0 0 0 -1 0 0 0 -1 stud4a.dat
  [1,16,90,140,30,1,0,0,0,-1,0,0,0,-1, ldraw_lib__stud4a(realsolid)],
// 1 16 90 140 30 8 0 0 0 -17 0 0 0 8 4-4cyli.dat
  [1,16,90,140,30,8,0,0,0,-17,0,0,0,8, ldraw_lib__4_4cyli(realsolid)],
// 1 16 90 123 30 -3.06147 0 -7.39104 0 -24 0 7.39104 0 -3.06147 3-8cyli.dat
  [1,16,90,123,30,-3.06147,0,-7.39104,0,-24,0,7.39104,0,-3.06147, ldraw_lib__3_8cyli(realsolid)],
// 1 16 90 99 30 -3.06147 0 -7.39104 0 -1 0 7.39104 0 -3.06147 3-8edge.dat
  [1,16,90,99,30,-3.06147,0,-7.39104,0,-1,0,7.39104,0,-3.06147, ldraw_lib__3_8edge(realsolid)],
// 1 16 90 123 30 -3.06147 0 7.39104 0 -1 0 -7.39104 0 -3.06147 5-8edge.dat
  [1,16,90,123,30,-3.06147,0,7.39104,0,-1,0,-7.39104,0,-3.06147, ldraw_lib__5_8edge(realsolid)],
// 0 BFC INVERTNEXT
  [0,"BFC","INVERTNEXT"],
// 1 16 90 140 30 6 0 0 0 -17 0 0 0 6 4-4cyli.dat
  [1,16,90,140,30,6,0,0,0,-17,0,0,0,6, ldraw_lib__4_4cyli(realsolid)],
// 0 BFC INVERTNEXT
  [0,"BFC","INVERTNEXT"],
// 1 16 90 123 30 -4.24264 0 -4.24264 0 -24 0 4.24264 0 -4.24264 1-4cyli.dat
  [1,16,90,123,30,-4.24264,0,-4.24264,0,-24,0,4.24264,0,-4.24264, ldraw_lib__1_4cyli(realsolid)],
// 1 16 90 99 30 -4.24264 0 -4.24264 0 -1 0 4.24264 0 -4.24264 1-4edge.dat
  [1,16,90,99,30,-4.24264,0,-4.24264,0,-1,0,4.24264,0,-4.24264, ldraw_lib__1_4edge(realsolid)],
// 1 16 90 123 30 -4.24264 0 4.24264 0 -1 0 -4.24264 0 -4.24264 3-4edge.dat
  [1,16,90,123,30,-4.24264,0,4.24264,0,-1,0,-4.24264,0,-4.24264, ldraw_lib__3_4edge(realsolid)],
// 2 24 85.7574 99 25.7574 85.7574 123 25.7574
  [2,24,85.7574,99,25.7574,85.7574,123,25.7574],
// 2 24 85.7574 99 34.2426 85.7574 123 34.2426
  [2,24,85.7574,99,34.2426,85.7574,123,34.2426],
// 2 24 85.7574 99 23.3981 85.7574 123 23.3981
  [2,24,85.7574,99,23.3981,85.7574,123,23.3981],
// 2 24 85.7574 99 36.6019 85.7574 123 36.6019
  [2,24,85.7574,99,36.6019,85.7574,123,36.6019],
// 2 24 85.7574 123 23.3981 86.9384 123 22.6088
  [2,24,85.7574,123,23.3981,86.9384,123,22.6088],
// 2 24 85.7574 123 36.6019 86.9384 123 37.3912
  [2,24,85.7574,123,36.6019,86.9384,123,37.3912],
];
module ldraw_lib__s__23996s01(step=0, col=false, unit=2/5, alt=false, line=0.2, solid=!$preview)
    makepoly(ldraw_lib__s__23996s01(solid), step=step, col=col, unit=unit, alt=alt, line=line, solid=solid);
ldraw_lib__s__23996s01(line=0.2);
